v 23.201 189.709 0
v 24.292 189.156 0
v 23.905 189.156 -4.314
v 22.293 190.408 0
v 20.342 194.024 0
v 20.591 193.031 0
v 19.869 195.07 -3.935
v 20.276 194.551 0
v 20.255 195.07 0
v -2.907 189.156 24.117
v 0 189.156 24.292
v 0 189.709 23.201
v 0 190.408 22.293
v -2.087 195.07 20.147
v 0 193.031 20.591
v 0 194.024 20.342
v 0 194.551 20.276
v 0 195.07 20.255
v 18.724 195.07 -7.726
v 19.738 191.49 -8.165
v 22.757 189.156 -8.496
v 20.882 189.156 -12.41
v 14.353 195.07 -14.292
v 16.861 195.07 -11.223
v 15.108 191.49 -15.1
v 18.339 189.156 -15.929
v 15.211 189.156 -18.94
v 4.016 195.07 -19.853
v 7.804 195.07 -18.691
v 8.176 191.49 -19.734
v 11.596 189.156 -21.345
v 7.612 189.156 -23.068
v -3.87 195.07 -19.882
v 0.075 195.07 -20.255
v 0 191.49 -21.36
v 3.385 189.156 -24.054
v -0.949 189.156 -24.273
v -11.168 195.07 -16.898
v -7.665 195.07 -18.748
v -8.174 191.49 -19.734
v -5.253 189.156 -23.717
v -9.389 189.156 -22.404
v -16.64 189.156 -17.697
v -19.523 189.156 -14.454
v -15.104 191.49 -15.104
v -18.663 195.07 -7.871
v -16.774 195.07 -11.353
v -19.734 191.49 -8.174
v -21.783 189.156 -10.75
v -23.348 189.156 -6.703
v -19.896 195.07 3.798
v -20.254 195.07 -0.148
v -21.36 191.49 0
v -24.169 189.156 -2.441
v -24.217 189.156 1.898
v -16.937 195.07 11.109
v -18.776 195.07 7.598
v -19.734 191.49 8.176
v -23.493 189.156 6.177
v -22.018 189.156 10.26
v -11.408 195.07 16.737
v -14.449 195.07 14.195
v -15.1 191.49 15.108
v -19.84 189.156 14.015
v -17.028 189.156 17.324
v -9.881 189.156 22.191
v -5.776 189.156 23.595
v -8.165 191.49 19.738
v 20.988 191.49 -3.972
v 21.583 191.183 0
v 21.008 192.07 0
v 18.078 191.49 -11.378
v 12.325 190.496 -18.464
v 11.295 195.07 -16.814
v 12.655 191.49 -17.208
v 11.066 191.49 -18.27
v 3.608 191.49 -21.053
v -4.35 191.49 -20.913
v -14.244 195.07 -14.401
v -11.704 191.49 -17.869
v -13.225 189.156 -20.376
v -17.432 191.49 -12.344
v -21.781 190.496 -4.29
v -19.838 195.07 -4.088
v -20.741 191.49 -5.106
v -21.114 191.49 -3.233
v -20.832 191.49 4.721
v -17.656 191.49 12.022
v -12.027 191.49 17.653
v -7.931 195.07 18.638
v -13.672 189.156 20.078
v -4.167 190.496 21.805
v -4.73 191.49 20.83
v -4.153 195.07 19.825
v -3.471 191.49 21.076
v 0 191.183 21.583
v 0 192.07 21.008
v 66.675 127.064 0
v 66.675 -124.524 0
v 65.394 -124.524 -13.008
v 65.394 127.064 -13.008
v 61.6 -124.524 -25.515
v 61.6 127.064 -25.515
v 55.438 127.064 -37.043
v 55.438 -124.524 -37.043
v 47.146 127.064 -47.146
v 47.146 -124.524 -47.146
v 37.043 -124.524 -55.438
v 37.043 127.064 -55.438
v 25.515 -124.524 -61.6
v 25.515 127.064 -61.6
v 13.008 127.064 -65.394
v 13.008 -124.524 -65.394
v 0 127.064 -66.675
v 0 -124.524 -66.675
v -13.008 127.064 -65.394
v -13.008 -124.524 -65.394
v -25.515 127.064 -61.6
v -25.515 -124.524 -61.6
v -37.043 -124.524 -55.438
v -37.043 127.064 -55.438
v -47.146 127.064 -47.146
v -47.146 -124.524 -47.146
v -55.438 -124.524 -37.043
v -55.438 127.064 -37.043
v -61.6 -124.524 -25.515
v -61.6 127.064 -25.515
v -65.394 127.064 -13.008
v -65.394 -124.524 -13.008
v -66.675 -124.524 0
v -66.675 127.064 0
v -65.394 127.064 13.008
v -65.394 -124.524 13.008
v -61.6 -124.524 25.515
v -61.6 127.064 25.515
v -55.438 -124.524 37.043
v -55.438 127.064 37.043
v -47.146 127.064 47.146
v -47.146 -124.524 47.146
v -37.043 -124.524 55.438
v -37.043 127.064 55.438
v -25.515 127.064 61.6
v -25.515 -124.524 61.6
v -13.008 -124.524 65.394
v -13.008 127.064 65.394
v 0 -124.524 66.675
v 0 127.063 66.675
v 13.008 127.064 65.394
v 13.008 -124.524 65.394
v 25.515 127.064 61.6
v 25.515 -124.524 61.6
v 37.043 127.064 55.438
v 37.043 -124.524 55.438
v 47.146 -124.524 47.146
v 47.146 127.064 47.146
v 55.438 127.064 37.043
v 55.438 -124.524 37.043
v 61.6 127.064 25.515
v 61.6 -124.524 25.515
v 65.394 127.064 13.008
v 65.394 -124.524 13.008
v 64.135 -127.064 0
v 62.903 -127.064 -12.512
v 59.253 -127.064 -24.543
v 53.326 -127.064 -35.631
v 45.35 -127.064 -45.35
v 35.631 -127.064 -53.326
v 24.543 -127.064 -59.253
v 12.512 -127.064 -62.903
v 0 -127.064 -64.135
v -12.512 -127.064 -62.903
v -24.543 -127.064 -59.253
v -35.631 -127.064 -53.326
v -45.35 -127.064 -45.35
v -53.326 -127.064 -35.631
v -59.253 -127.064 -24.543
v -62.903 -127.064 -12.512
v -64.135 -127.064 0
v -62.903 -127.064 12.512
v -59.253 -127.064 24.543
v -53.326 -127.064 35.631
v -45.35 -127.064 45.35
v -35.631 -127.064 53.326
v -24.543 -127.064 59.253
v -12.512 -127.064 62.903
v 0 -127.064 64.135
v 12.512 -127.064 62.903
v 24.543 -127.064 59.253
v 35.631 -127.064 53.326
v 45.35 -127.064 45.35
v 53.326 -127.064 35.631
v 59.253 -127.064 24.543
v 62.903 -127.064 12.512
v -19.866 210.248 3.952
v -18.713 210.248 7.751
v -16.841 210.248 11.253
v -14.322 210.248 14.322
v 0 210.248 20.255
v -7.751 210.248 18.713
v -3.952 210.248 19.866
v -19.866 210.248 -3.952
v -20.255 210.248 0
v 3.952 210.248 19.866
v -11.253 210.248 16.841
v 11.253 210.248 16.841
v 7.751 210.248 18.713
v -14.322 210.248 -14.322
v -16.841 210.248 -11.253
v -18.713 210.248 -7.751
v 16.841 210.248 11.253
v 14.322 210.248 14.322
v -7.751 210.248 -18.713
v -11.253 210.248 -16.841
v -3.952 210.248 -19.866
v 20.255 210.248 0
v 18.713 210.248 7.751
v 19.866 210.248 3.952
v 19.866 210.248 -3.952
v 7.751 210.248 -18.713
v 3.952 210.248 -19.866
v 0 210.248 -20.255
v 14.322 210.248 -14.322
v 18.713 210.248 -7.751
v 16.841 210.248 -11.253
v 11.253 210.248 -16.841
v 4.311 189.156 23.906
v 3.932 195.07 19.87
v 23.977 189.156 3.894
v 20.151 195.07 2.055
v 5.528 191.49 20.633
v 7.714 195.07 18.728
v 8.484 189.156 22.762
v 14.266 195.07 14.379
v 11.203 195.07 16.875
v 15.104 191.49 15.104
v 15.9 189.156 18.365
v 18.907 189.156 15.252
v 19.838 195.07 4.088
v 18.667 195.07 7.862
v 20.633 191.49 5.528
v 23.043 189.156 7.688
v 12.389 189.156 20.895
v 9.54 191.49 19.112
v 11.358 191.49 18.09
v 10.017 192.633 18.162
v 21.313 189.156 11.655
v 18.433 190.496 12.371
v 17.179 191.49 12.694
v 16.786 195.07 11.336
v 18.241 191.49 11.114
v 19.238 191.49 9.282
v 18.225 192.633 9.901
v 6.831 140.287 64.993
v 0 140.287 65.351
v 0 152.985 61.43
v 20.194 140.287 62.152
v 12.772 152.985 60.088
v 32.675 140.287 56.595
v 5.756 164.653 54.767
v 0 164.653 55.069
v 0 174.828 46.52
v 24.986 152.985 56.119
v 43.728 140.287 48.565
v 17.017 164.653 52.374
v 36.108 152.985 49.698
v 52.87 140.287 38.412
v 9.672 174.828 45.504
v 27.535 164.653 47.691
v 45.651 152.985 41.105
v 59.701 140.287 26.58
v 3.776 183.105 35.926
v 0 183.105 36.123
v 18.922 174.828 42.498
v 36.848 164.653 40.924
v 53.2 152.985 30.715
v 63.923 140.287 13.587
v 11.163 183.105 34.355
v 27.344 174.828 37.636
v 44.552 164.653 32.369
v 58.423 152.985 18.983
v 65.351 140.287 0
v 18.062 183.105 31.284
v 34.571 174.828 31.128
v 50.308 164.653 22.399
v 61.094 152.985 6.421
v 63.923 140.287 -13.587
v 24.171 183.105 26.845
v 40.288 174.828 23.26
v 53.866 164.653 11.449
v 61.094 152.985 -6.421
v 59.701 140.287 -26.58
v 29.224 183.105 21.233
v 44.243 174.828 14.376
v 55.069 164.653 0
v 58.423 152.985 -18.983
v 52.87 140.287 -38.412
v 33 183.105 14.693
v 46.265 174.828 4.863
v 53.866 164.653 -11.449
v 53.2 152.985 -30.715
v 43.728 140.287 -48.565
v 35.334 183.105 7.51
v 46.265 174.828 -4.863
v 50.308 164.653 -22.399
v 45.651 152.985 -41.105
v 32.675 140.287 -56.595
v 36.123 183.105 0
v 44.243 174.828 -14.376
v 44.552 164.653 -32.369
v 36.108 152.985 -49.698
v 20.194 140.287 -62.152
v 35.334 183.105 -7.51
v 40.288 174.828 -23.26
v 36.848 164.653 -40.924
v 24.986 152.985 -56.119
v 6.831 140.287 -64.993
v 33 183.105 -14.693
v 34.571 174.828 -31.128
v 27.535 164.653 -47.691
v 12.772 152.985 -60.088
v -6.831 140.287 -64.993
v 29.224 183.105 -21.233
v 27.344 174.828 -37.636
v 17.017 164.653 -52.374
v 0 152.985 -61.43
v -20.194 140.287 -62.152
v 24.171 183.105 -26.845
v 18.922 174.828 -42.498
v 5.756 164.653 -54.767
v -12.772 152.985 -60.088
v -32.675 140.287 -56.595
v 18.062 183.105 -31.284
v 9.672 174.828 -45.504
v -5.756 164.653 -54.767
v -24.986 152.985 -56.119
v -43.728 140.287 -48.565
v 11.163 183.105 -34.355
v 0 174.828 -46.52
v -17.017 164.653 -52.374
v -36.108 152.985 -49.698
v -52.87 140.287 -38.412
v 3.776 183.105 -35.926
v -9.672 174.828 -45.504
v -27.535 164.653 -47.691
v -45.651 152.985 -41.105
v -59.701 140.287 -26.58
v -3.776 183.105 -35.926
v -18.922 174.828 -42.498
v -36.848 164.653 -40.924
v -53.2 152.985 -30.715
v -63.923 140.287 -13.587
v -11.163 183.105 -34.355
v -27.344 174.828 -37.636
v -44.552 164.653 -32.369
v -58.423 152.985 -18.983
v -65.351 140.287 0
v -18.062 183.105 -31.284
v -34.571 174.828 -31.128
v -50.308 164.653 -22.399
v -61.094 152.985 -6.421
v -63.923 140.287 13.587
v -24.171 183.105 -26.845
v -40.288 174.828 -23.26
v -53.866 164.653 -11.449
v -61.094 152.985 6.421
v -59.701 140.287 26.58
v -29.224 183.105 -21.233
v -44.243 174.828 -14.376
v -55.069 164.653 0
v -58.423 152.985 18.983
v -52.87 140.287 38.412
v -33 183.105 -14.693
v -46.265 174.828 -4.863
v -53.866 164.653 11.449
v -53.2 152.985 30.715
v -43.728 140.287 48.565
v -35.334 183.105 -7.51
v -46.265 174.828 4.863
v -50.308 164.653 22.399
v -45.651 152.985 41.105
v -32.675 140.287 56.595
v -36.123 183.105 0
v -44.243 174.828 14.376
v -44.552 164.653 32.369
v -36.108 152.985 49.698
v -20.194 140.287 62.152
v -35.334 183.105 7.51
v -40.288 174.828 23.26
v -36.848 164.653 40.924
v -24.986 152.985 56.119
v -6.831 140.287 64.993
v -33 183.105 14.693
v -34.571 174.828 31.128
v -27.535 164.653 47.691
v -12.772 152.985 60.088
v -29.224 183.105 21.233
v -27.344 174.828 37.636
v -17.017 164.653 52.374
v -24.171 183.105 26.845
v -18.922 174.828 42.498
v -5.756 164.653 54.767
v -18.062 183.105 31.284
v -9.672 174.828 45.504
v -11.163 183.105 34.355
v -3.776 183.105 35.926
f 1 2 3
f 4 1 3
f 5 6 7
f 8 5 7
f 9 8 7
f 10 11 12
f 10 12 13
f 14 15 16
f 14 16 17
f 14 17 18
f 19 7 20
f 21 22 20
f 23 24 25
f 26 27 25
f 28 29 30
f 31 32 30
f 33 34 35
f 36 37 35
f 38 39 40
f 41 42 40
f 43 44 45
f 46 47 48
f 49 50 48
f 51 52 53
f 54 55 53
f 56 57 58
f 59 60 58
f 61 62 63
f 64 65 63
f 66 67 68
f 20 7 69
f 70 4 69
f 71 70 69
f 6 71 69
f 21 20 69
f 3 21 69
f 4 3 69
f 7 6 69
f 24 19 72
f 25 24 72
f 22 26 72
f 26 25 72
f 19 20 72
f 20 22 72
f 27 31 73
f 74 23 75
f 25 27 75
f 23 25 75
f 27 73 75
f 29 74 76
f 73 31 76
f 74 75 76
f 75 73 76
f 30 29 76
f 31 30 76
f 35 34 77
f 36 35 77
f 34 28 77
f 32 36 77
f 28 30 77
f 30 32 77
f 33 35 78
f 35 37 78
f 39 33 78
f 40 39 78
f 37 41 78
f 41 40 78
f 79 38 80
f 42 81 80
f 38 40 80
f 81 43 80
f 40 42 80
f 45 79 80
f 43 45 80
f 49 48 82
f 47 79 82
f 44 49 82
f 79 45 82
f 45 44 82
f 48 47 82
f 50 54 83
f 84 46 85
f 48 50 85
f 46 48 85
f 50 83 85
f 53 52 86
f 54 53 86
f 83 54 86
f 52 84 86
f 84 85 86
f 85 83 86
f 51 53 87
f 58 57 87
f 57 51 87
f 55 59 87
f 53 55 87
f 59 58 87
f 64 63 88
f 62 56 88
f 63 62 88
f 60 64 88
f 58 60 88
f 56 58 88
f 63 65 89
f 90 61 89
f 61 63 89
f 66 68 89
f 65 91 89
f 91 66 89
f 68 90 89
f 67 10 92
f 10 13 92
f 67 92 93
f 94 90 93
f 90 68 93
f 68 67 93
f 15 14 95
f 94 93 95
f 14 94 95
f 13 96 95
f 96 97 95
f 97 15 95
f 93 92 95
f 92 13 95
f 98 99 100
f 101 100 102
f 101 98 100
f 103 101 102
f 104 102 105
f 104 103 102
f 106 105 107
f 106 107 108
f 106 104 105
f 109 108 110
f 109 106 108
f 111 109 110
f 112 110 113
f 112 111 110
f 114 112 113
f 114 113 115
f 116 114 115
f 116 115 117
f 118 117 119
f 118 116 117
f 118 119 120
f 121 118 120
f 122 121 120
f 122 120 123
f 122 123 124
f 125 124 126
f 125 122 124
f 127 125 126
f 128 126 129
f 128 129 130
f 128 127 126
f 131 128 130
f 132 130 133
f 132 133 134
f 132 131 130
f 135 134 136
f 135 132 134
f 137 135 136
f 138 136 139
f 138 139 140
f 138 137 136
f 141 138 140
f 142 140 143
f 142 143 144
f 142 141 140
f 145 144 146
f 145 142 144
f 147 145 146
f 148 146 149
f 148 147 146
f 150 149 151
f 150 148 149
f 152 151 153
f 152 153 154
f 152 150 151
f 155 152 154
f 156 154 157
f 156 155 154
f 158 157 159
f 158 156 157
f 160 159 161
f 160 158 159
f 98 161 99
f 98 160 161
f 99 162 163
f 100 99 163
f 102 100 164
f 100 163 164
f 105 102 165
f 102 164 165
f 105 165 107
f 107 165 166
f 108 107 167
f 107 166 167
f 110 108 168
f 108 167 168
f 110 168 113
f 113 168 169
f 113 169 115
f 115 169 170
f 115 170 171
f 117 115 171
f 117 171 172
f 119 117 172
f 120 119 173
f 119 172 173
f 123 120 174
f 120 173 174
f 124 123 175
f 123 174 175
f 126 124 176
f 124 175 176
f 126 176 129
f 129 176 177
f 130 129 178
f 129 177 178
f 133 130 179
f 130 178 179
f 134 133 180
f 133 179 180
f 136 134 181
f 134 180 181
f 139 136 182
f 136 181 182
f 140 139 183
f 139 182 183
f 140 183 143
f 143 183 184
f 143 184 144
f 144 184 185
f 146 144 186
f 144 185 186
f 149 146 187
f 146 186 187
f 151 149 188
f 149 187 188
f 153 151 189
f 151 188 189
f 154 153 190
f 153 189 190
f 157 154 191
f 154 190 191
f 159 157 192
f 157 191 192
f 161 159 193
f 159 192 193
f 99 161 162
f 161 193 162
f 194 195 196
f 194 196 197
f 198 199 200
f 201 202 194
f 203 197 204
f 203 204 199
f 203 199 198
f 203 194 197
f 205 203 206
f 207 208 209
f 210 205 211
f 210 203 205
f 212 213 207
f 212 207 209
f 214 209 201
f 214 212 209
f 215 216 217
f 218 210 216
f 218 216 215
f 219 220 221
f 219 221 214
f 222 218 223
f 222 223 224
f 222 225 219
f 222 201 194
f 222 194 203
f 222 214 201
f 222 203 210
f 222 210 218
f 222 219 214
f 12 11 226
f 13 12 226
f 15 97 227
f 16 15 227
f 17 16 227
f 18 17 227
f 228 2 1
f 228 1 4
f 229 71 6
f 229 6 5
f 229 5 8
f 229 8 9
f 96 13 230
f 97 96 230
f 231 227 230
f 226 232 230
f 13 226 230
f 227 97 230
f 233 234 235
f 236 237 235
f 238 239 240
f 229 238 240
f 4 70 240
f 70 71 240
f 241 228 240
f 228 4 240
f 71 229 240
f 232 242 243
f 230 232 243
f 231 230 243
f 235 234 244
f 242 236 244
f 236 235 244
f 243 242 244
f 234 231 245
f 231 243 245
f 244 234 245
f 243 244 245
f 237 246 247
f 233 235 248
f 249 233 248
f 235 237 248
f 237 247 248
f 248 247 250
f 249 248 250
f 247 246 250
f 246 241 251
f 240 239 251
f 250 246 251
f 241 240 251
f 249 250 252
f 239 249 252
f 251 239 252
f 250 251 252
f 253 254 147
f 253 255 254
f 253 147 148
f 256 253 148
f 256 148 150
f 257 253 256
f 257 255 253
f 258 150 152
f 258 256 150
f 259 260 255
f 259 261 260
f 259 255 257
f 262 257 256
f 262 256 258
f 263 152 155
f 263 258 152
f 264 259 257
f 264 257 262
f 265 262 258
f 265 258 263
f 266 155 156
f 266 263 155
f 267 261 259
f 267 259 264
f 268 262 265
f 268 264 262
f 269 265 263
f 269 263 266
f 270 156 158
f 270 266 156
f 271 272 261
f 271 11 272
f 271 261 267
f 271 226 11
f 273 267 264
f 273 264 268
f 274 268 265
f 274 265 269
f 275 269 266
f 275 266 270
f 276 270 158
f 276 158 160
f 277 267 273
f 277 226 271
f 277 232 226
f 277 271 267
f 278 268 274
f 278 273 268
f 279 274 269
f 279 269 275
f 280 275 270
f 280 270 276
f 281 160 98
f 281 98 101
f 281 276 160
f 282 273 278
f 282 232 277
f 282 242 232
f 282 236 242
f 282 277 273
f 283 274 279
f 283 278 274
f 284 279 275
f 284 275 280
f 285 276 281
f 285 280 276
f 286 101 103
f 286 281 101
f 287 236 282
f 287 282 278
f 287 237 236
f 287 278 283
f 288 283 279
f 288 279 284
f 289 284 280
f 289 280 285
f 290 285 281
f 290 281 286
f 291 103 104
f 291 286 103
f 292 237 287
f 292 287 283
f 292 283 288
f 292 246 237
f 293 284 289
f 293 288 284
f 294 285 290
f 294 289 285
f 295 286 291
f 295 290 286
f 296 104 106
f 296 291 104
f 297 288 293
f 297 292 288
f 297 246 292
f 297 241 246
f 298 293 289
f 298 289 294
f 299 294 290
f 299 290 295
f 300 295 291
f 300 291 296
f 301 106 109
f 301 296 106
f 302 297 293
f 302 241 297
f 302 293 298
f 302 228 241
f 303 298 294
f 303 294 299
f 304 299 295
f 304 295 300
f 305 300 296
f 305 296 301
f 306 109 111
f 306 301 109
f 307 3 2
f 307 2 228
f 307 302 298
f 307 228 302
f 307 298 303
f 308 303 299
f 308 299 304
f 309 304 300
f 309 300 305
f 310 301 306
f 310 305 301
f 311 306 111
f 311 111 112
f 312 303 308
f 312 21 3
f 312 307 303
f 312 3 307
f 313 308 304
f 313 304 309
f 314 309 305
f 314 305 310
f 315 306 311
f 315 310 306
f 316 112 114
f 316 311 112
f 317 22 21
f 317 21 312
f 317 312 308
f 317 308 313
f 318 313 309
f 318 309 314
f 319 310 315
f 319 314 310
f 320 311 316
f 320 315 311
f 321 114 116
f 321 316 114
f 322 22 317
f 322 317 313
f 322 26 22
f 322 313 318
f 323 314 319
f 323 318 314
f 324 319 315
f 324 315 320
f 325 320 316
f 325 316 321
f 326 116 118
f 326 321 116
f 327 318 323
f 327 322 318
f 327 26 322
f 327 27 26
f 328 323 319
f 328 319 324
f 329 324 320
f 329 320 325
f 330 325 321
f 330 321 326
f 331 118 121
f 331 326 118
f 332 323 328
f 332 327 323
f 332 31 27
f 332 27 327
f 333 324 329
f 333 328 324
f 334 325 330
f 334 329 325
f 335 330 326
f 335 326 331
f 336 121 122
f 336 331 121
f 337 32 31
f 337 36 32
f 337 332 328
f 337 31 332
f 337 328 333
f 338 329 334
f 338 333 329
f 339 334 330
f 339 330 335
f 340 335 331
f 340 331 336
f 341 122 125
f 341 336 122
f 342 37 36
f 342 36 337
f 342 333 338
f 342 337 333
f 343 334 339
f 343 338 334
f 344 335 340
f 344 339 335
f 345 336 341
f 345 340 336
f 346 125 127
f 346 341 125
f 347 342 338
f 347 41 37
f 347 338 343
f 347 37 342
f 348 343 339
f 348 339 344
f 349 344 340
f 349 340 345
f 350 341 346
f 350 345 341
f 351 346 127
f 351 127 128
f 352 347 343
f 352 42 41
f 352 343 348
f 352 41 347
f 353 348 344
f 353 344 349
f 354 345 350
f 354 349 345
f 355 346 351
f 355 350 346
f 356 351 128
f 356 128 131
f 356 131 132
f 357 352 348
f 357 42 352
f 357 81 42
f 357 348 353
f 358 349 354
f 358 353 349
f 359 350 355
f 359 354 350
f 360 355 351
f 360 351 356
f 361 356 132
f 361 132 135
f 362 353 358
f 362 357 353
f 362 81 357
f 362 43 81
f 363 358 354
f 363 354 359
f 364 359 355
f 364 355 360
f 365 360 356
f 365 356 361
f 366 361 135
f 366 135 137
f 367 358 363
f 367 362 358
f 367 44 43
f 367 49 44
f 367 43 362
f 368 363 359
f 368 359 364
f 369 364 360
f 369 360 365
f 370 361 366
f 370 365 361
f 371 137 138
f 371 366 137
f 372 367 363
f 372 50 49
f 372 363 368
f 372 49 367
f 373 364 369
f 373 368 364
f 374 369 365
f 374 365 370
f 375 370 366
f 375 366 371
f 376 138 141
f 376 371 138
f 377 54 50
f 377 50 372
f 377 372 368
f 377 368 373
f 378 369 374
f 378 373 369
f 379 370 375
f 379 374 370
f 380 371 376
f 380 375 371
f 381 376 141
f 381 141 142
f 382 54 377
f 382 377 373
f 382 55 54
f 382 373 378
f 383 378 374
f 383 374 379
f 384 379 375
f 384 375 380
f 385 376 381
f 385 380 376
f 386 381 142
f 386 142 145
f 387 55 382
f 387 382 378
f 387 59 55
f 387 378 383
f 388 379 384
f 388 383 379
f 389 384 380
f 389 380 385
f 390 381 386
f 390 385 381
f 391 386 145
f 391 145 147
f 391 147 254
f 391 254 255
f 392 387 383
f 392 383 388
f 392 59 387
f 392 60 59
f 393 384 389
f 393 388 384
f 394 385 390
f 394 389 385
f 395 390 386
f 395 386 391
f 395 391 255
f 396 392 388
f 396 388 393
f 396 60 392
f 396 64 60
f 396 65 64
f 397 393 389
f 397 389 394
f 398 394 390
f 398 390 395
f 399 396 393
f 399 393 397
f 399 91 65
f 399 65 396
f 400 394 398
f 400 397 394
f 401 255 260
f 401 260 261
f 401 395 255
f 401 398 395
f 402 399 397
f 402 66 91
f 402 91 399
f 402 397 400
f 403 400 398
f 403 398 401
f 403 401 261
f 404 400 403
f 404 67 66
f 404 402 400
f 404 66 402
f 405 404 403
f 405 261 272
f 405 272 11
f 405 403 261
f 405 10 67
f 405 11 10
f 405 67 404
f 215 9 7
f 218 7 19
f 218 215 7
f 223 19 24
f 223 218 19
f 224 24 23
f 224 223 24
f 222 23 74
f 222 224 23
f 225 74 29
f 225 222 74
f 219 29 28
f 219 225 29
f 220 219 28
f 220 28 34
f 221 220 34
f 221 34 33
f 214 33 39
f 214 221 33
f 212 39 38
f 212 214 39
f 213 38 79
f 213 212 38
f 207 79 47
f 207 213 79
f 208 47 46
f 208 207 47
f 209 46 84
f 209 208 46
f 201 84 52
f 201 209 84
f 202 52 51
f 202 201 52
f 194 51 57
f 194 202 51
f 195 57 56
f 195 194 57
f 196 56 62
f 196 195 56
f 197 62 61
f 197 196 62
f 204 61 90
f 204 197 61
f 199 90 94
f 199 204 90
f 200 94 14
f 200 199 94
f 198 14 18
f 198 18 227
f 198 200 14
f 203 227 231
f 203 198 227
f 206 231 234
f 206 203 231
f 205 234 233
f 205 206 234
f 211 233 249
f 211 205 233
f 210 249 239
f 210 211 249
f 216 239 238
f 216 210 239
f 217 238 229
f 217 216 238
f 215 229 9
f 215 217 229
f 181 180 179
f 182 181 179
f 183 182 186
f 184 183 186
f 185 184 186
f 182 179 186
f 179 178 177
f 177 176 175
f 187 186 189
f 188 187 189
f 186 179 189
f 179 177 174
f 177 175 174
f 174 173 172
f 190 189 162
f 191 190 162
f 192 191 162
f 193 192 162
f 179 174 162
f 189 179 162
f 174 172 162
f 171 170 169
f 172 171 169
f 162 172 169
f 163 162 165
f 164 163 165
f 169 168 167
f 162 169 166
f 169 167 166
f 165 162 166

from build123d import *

# Parameters (mm, degrees)
SKETCH1_R           = 66.675
BOSS_EXTRUDE1_DEPTH = 127.0635
DOME1_FACE_RADIUS   = 66.675
DOME1_HEIGHT        = 66.675
SKETCH5_R           = 20.255
BOSS_EXTRUDE2_DEPTH = 16.51
CHAMFER1_SIZE       = 2.54
FILLET1_R           = 6.35


with BuildPart() as part:
    # Sketch1 → Boss-Extrude1 (new body, symmetric)
    with BuildSketch(Plane(origin=(0, 0, 0), x_dir=(1, 0, 0), z_dir=(0, 1, 0))):
        Circle(SKETCH1_R)
    extrude(amount=BOSS_EXTRUDE1_DEPTH, both=True)

    # Dome1: a dome of height H over a round flat face of radius A is a cap of a sphere of radius (A * A + H * H) / (2 * H)
    dome1_r = (DOME1_FACE_RADIUS * DOME1_FACE_RADIUS + DOME1_HEIGHT * DOME1_HEIGHT) / (2 * DOME1_HEIGHT)
    dome1_base = Plane((0, 127.0635, 0), z_dir=(0, 1, 0))
    with Locations(dome1_base.offset(DOME1_HEIGHT - dome1_r)):
        dome1_ball = Sphere(dome1_r, mode=Mode.PRIVATE)
    add(split(dome1_ball, bisect_by=dome1_base, keep=Keep.TOP, mode=Mode.PRIVATE))

    # Sketch5 → Boss-Extrude2 (add, symmetric)
    with BuildSketch(Plane(origin=(0, 193.7385, 0), x_dir=(1, 0, 0), z_dir=(0, 1, 0))):
        Circle(SKETCH5_R)
    extrude(amount=BOSS_EXTRUDE2_DEPTH, both=True)

    # Chamfer1
    chamfer1_edges = [part.edges().sort_by_distance(p)[0] for p in [
        (-66.675, -127.0635, 0),
    ]]
    chamfer(chamfer1_edges, length=CHAMFER1_SIZE)

    # Fillet1
    fillet1_edges = [part.edges().sort_by_distance(p)[0] for p in [
        (-14.322447853, 190.587437221, -14.322447853),
    ]]
    fillet(fillet1_edges, radius=FILLET1_R)


solid = part.part
